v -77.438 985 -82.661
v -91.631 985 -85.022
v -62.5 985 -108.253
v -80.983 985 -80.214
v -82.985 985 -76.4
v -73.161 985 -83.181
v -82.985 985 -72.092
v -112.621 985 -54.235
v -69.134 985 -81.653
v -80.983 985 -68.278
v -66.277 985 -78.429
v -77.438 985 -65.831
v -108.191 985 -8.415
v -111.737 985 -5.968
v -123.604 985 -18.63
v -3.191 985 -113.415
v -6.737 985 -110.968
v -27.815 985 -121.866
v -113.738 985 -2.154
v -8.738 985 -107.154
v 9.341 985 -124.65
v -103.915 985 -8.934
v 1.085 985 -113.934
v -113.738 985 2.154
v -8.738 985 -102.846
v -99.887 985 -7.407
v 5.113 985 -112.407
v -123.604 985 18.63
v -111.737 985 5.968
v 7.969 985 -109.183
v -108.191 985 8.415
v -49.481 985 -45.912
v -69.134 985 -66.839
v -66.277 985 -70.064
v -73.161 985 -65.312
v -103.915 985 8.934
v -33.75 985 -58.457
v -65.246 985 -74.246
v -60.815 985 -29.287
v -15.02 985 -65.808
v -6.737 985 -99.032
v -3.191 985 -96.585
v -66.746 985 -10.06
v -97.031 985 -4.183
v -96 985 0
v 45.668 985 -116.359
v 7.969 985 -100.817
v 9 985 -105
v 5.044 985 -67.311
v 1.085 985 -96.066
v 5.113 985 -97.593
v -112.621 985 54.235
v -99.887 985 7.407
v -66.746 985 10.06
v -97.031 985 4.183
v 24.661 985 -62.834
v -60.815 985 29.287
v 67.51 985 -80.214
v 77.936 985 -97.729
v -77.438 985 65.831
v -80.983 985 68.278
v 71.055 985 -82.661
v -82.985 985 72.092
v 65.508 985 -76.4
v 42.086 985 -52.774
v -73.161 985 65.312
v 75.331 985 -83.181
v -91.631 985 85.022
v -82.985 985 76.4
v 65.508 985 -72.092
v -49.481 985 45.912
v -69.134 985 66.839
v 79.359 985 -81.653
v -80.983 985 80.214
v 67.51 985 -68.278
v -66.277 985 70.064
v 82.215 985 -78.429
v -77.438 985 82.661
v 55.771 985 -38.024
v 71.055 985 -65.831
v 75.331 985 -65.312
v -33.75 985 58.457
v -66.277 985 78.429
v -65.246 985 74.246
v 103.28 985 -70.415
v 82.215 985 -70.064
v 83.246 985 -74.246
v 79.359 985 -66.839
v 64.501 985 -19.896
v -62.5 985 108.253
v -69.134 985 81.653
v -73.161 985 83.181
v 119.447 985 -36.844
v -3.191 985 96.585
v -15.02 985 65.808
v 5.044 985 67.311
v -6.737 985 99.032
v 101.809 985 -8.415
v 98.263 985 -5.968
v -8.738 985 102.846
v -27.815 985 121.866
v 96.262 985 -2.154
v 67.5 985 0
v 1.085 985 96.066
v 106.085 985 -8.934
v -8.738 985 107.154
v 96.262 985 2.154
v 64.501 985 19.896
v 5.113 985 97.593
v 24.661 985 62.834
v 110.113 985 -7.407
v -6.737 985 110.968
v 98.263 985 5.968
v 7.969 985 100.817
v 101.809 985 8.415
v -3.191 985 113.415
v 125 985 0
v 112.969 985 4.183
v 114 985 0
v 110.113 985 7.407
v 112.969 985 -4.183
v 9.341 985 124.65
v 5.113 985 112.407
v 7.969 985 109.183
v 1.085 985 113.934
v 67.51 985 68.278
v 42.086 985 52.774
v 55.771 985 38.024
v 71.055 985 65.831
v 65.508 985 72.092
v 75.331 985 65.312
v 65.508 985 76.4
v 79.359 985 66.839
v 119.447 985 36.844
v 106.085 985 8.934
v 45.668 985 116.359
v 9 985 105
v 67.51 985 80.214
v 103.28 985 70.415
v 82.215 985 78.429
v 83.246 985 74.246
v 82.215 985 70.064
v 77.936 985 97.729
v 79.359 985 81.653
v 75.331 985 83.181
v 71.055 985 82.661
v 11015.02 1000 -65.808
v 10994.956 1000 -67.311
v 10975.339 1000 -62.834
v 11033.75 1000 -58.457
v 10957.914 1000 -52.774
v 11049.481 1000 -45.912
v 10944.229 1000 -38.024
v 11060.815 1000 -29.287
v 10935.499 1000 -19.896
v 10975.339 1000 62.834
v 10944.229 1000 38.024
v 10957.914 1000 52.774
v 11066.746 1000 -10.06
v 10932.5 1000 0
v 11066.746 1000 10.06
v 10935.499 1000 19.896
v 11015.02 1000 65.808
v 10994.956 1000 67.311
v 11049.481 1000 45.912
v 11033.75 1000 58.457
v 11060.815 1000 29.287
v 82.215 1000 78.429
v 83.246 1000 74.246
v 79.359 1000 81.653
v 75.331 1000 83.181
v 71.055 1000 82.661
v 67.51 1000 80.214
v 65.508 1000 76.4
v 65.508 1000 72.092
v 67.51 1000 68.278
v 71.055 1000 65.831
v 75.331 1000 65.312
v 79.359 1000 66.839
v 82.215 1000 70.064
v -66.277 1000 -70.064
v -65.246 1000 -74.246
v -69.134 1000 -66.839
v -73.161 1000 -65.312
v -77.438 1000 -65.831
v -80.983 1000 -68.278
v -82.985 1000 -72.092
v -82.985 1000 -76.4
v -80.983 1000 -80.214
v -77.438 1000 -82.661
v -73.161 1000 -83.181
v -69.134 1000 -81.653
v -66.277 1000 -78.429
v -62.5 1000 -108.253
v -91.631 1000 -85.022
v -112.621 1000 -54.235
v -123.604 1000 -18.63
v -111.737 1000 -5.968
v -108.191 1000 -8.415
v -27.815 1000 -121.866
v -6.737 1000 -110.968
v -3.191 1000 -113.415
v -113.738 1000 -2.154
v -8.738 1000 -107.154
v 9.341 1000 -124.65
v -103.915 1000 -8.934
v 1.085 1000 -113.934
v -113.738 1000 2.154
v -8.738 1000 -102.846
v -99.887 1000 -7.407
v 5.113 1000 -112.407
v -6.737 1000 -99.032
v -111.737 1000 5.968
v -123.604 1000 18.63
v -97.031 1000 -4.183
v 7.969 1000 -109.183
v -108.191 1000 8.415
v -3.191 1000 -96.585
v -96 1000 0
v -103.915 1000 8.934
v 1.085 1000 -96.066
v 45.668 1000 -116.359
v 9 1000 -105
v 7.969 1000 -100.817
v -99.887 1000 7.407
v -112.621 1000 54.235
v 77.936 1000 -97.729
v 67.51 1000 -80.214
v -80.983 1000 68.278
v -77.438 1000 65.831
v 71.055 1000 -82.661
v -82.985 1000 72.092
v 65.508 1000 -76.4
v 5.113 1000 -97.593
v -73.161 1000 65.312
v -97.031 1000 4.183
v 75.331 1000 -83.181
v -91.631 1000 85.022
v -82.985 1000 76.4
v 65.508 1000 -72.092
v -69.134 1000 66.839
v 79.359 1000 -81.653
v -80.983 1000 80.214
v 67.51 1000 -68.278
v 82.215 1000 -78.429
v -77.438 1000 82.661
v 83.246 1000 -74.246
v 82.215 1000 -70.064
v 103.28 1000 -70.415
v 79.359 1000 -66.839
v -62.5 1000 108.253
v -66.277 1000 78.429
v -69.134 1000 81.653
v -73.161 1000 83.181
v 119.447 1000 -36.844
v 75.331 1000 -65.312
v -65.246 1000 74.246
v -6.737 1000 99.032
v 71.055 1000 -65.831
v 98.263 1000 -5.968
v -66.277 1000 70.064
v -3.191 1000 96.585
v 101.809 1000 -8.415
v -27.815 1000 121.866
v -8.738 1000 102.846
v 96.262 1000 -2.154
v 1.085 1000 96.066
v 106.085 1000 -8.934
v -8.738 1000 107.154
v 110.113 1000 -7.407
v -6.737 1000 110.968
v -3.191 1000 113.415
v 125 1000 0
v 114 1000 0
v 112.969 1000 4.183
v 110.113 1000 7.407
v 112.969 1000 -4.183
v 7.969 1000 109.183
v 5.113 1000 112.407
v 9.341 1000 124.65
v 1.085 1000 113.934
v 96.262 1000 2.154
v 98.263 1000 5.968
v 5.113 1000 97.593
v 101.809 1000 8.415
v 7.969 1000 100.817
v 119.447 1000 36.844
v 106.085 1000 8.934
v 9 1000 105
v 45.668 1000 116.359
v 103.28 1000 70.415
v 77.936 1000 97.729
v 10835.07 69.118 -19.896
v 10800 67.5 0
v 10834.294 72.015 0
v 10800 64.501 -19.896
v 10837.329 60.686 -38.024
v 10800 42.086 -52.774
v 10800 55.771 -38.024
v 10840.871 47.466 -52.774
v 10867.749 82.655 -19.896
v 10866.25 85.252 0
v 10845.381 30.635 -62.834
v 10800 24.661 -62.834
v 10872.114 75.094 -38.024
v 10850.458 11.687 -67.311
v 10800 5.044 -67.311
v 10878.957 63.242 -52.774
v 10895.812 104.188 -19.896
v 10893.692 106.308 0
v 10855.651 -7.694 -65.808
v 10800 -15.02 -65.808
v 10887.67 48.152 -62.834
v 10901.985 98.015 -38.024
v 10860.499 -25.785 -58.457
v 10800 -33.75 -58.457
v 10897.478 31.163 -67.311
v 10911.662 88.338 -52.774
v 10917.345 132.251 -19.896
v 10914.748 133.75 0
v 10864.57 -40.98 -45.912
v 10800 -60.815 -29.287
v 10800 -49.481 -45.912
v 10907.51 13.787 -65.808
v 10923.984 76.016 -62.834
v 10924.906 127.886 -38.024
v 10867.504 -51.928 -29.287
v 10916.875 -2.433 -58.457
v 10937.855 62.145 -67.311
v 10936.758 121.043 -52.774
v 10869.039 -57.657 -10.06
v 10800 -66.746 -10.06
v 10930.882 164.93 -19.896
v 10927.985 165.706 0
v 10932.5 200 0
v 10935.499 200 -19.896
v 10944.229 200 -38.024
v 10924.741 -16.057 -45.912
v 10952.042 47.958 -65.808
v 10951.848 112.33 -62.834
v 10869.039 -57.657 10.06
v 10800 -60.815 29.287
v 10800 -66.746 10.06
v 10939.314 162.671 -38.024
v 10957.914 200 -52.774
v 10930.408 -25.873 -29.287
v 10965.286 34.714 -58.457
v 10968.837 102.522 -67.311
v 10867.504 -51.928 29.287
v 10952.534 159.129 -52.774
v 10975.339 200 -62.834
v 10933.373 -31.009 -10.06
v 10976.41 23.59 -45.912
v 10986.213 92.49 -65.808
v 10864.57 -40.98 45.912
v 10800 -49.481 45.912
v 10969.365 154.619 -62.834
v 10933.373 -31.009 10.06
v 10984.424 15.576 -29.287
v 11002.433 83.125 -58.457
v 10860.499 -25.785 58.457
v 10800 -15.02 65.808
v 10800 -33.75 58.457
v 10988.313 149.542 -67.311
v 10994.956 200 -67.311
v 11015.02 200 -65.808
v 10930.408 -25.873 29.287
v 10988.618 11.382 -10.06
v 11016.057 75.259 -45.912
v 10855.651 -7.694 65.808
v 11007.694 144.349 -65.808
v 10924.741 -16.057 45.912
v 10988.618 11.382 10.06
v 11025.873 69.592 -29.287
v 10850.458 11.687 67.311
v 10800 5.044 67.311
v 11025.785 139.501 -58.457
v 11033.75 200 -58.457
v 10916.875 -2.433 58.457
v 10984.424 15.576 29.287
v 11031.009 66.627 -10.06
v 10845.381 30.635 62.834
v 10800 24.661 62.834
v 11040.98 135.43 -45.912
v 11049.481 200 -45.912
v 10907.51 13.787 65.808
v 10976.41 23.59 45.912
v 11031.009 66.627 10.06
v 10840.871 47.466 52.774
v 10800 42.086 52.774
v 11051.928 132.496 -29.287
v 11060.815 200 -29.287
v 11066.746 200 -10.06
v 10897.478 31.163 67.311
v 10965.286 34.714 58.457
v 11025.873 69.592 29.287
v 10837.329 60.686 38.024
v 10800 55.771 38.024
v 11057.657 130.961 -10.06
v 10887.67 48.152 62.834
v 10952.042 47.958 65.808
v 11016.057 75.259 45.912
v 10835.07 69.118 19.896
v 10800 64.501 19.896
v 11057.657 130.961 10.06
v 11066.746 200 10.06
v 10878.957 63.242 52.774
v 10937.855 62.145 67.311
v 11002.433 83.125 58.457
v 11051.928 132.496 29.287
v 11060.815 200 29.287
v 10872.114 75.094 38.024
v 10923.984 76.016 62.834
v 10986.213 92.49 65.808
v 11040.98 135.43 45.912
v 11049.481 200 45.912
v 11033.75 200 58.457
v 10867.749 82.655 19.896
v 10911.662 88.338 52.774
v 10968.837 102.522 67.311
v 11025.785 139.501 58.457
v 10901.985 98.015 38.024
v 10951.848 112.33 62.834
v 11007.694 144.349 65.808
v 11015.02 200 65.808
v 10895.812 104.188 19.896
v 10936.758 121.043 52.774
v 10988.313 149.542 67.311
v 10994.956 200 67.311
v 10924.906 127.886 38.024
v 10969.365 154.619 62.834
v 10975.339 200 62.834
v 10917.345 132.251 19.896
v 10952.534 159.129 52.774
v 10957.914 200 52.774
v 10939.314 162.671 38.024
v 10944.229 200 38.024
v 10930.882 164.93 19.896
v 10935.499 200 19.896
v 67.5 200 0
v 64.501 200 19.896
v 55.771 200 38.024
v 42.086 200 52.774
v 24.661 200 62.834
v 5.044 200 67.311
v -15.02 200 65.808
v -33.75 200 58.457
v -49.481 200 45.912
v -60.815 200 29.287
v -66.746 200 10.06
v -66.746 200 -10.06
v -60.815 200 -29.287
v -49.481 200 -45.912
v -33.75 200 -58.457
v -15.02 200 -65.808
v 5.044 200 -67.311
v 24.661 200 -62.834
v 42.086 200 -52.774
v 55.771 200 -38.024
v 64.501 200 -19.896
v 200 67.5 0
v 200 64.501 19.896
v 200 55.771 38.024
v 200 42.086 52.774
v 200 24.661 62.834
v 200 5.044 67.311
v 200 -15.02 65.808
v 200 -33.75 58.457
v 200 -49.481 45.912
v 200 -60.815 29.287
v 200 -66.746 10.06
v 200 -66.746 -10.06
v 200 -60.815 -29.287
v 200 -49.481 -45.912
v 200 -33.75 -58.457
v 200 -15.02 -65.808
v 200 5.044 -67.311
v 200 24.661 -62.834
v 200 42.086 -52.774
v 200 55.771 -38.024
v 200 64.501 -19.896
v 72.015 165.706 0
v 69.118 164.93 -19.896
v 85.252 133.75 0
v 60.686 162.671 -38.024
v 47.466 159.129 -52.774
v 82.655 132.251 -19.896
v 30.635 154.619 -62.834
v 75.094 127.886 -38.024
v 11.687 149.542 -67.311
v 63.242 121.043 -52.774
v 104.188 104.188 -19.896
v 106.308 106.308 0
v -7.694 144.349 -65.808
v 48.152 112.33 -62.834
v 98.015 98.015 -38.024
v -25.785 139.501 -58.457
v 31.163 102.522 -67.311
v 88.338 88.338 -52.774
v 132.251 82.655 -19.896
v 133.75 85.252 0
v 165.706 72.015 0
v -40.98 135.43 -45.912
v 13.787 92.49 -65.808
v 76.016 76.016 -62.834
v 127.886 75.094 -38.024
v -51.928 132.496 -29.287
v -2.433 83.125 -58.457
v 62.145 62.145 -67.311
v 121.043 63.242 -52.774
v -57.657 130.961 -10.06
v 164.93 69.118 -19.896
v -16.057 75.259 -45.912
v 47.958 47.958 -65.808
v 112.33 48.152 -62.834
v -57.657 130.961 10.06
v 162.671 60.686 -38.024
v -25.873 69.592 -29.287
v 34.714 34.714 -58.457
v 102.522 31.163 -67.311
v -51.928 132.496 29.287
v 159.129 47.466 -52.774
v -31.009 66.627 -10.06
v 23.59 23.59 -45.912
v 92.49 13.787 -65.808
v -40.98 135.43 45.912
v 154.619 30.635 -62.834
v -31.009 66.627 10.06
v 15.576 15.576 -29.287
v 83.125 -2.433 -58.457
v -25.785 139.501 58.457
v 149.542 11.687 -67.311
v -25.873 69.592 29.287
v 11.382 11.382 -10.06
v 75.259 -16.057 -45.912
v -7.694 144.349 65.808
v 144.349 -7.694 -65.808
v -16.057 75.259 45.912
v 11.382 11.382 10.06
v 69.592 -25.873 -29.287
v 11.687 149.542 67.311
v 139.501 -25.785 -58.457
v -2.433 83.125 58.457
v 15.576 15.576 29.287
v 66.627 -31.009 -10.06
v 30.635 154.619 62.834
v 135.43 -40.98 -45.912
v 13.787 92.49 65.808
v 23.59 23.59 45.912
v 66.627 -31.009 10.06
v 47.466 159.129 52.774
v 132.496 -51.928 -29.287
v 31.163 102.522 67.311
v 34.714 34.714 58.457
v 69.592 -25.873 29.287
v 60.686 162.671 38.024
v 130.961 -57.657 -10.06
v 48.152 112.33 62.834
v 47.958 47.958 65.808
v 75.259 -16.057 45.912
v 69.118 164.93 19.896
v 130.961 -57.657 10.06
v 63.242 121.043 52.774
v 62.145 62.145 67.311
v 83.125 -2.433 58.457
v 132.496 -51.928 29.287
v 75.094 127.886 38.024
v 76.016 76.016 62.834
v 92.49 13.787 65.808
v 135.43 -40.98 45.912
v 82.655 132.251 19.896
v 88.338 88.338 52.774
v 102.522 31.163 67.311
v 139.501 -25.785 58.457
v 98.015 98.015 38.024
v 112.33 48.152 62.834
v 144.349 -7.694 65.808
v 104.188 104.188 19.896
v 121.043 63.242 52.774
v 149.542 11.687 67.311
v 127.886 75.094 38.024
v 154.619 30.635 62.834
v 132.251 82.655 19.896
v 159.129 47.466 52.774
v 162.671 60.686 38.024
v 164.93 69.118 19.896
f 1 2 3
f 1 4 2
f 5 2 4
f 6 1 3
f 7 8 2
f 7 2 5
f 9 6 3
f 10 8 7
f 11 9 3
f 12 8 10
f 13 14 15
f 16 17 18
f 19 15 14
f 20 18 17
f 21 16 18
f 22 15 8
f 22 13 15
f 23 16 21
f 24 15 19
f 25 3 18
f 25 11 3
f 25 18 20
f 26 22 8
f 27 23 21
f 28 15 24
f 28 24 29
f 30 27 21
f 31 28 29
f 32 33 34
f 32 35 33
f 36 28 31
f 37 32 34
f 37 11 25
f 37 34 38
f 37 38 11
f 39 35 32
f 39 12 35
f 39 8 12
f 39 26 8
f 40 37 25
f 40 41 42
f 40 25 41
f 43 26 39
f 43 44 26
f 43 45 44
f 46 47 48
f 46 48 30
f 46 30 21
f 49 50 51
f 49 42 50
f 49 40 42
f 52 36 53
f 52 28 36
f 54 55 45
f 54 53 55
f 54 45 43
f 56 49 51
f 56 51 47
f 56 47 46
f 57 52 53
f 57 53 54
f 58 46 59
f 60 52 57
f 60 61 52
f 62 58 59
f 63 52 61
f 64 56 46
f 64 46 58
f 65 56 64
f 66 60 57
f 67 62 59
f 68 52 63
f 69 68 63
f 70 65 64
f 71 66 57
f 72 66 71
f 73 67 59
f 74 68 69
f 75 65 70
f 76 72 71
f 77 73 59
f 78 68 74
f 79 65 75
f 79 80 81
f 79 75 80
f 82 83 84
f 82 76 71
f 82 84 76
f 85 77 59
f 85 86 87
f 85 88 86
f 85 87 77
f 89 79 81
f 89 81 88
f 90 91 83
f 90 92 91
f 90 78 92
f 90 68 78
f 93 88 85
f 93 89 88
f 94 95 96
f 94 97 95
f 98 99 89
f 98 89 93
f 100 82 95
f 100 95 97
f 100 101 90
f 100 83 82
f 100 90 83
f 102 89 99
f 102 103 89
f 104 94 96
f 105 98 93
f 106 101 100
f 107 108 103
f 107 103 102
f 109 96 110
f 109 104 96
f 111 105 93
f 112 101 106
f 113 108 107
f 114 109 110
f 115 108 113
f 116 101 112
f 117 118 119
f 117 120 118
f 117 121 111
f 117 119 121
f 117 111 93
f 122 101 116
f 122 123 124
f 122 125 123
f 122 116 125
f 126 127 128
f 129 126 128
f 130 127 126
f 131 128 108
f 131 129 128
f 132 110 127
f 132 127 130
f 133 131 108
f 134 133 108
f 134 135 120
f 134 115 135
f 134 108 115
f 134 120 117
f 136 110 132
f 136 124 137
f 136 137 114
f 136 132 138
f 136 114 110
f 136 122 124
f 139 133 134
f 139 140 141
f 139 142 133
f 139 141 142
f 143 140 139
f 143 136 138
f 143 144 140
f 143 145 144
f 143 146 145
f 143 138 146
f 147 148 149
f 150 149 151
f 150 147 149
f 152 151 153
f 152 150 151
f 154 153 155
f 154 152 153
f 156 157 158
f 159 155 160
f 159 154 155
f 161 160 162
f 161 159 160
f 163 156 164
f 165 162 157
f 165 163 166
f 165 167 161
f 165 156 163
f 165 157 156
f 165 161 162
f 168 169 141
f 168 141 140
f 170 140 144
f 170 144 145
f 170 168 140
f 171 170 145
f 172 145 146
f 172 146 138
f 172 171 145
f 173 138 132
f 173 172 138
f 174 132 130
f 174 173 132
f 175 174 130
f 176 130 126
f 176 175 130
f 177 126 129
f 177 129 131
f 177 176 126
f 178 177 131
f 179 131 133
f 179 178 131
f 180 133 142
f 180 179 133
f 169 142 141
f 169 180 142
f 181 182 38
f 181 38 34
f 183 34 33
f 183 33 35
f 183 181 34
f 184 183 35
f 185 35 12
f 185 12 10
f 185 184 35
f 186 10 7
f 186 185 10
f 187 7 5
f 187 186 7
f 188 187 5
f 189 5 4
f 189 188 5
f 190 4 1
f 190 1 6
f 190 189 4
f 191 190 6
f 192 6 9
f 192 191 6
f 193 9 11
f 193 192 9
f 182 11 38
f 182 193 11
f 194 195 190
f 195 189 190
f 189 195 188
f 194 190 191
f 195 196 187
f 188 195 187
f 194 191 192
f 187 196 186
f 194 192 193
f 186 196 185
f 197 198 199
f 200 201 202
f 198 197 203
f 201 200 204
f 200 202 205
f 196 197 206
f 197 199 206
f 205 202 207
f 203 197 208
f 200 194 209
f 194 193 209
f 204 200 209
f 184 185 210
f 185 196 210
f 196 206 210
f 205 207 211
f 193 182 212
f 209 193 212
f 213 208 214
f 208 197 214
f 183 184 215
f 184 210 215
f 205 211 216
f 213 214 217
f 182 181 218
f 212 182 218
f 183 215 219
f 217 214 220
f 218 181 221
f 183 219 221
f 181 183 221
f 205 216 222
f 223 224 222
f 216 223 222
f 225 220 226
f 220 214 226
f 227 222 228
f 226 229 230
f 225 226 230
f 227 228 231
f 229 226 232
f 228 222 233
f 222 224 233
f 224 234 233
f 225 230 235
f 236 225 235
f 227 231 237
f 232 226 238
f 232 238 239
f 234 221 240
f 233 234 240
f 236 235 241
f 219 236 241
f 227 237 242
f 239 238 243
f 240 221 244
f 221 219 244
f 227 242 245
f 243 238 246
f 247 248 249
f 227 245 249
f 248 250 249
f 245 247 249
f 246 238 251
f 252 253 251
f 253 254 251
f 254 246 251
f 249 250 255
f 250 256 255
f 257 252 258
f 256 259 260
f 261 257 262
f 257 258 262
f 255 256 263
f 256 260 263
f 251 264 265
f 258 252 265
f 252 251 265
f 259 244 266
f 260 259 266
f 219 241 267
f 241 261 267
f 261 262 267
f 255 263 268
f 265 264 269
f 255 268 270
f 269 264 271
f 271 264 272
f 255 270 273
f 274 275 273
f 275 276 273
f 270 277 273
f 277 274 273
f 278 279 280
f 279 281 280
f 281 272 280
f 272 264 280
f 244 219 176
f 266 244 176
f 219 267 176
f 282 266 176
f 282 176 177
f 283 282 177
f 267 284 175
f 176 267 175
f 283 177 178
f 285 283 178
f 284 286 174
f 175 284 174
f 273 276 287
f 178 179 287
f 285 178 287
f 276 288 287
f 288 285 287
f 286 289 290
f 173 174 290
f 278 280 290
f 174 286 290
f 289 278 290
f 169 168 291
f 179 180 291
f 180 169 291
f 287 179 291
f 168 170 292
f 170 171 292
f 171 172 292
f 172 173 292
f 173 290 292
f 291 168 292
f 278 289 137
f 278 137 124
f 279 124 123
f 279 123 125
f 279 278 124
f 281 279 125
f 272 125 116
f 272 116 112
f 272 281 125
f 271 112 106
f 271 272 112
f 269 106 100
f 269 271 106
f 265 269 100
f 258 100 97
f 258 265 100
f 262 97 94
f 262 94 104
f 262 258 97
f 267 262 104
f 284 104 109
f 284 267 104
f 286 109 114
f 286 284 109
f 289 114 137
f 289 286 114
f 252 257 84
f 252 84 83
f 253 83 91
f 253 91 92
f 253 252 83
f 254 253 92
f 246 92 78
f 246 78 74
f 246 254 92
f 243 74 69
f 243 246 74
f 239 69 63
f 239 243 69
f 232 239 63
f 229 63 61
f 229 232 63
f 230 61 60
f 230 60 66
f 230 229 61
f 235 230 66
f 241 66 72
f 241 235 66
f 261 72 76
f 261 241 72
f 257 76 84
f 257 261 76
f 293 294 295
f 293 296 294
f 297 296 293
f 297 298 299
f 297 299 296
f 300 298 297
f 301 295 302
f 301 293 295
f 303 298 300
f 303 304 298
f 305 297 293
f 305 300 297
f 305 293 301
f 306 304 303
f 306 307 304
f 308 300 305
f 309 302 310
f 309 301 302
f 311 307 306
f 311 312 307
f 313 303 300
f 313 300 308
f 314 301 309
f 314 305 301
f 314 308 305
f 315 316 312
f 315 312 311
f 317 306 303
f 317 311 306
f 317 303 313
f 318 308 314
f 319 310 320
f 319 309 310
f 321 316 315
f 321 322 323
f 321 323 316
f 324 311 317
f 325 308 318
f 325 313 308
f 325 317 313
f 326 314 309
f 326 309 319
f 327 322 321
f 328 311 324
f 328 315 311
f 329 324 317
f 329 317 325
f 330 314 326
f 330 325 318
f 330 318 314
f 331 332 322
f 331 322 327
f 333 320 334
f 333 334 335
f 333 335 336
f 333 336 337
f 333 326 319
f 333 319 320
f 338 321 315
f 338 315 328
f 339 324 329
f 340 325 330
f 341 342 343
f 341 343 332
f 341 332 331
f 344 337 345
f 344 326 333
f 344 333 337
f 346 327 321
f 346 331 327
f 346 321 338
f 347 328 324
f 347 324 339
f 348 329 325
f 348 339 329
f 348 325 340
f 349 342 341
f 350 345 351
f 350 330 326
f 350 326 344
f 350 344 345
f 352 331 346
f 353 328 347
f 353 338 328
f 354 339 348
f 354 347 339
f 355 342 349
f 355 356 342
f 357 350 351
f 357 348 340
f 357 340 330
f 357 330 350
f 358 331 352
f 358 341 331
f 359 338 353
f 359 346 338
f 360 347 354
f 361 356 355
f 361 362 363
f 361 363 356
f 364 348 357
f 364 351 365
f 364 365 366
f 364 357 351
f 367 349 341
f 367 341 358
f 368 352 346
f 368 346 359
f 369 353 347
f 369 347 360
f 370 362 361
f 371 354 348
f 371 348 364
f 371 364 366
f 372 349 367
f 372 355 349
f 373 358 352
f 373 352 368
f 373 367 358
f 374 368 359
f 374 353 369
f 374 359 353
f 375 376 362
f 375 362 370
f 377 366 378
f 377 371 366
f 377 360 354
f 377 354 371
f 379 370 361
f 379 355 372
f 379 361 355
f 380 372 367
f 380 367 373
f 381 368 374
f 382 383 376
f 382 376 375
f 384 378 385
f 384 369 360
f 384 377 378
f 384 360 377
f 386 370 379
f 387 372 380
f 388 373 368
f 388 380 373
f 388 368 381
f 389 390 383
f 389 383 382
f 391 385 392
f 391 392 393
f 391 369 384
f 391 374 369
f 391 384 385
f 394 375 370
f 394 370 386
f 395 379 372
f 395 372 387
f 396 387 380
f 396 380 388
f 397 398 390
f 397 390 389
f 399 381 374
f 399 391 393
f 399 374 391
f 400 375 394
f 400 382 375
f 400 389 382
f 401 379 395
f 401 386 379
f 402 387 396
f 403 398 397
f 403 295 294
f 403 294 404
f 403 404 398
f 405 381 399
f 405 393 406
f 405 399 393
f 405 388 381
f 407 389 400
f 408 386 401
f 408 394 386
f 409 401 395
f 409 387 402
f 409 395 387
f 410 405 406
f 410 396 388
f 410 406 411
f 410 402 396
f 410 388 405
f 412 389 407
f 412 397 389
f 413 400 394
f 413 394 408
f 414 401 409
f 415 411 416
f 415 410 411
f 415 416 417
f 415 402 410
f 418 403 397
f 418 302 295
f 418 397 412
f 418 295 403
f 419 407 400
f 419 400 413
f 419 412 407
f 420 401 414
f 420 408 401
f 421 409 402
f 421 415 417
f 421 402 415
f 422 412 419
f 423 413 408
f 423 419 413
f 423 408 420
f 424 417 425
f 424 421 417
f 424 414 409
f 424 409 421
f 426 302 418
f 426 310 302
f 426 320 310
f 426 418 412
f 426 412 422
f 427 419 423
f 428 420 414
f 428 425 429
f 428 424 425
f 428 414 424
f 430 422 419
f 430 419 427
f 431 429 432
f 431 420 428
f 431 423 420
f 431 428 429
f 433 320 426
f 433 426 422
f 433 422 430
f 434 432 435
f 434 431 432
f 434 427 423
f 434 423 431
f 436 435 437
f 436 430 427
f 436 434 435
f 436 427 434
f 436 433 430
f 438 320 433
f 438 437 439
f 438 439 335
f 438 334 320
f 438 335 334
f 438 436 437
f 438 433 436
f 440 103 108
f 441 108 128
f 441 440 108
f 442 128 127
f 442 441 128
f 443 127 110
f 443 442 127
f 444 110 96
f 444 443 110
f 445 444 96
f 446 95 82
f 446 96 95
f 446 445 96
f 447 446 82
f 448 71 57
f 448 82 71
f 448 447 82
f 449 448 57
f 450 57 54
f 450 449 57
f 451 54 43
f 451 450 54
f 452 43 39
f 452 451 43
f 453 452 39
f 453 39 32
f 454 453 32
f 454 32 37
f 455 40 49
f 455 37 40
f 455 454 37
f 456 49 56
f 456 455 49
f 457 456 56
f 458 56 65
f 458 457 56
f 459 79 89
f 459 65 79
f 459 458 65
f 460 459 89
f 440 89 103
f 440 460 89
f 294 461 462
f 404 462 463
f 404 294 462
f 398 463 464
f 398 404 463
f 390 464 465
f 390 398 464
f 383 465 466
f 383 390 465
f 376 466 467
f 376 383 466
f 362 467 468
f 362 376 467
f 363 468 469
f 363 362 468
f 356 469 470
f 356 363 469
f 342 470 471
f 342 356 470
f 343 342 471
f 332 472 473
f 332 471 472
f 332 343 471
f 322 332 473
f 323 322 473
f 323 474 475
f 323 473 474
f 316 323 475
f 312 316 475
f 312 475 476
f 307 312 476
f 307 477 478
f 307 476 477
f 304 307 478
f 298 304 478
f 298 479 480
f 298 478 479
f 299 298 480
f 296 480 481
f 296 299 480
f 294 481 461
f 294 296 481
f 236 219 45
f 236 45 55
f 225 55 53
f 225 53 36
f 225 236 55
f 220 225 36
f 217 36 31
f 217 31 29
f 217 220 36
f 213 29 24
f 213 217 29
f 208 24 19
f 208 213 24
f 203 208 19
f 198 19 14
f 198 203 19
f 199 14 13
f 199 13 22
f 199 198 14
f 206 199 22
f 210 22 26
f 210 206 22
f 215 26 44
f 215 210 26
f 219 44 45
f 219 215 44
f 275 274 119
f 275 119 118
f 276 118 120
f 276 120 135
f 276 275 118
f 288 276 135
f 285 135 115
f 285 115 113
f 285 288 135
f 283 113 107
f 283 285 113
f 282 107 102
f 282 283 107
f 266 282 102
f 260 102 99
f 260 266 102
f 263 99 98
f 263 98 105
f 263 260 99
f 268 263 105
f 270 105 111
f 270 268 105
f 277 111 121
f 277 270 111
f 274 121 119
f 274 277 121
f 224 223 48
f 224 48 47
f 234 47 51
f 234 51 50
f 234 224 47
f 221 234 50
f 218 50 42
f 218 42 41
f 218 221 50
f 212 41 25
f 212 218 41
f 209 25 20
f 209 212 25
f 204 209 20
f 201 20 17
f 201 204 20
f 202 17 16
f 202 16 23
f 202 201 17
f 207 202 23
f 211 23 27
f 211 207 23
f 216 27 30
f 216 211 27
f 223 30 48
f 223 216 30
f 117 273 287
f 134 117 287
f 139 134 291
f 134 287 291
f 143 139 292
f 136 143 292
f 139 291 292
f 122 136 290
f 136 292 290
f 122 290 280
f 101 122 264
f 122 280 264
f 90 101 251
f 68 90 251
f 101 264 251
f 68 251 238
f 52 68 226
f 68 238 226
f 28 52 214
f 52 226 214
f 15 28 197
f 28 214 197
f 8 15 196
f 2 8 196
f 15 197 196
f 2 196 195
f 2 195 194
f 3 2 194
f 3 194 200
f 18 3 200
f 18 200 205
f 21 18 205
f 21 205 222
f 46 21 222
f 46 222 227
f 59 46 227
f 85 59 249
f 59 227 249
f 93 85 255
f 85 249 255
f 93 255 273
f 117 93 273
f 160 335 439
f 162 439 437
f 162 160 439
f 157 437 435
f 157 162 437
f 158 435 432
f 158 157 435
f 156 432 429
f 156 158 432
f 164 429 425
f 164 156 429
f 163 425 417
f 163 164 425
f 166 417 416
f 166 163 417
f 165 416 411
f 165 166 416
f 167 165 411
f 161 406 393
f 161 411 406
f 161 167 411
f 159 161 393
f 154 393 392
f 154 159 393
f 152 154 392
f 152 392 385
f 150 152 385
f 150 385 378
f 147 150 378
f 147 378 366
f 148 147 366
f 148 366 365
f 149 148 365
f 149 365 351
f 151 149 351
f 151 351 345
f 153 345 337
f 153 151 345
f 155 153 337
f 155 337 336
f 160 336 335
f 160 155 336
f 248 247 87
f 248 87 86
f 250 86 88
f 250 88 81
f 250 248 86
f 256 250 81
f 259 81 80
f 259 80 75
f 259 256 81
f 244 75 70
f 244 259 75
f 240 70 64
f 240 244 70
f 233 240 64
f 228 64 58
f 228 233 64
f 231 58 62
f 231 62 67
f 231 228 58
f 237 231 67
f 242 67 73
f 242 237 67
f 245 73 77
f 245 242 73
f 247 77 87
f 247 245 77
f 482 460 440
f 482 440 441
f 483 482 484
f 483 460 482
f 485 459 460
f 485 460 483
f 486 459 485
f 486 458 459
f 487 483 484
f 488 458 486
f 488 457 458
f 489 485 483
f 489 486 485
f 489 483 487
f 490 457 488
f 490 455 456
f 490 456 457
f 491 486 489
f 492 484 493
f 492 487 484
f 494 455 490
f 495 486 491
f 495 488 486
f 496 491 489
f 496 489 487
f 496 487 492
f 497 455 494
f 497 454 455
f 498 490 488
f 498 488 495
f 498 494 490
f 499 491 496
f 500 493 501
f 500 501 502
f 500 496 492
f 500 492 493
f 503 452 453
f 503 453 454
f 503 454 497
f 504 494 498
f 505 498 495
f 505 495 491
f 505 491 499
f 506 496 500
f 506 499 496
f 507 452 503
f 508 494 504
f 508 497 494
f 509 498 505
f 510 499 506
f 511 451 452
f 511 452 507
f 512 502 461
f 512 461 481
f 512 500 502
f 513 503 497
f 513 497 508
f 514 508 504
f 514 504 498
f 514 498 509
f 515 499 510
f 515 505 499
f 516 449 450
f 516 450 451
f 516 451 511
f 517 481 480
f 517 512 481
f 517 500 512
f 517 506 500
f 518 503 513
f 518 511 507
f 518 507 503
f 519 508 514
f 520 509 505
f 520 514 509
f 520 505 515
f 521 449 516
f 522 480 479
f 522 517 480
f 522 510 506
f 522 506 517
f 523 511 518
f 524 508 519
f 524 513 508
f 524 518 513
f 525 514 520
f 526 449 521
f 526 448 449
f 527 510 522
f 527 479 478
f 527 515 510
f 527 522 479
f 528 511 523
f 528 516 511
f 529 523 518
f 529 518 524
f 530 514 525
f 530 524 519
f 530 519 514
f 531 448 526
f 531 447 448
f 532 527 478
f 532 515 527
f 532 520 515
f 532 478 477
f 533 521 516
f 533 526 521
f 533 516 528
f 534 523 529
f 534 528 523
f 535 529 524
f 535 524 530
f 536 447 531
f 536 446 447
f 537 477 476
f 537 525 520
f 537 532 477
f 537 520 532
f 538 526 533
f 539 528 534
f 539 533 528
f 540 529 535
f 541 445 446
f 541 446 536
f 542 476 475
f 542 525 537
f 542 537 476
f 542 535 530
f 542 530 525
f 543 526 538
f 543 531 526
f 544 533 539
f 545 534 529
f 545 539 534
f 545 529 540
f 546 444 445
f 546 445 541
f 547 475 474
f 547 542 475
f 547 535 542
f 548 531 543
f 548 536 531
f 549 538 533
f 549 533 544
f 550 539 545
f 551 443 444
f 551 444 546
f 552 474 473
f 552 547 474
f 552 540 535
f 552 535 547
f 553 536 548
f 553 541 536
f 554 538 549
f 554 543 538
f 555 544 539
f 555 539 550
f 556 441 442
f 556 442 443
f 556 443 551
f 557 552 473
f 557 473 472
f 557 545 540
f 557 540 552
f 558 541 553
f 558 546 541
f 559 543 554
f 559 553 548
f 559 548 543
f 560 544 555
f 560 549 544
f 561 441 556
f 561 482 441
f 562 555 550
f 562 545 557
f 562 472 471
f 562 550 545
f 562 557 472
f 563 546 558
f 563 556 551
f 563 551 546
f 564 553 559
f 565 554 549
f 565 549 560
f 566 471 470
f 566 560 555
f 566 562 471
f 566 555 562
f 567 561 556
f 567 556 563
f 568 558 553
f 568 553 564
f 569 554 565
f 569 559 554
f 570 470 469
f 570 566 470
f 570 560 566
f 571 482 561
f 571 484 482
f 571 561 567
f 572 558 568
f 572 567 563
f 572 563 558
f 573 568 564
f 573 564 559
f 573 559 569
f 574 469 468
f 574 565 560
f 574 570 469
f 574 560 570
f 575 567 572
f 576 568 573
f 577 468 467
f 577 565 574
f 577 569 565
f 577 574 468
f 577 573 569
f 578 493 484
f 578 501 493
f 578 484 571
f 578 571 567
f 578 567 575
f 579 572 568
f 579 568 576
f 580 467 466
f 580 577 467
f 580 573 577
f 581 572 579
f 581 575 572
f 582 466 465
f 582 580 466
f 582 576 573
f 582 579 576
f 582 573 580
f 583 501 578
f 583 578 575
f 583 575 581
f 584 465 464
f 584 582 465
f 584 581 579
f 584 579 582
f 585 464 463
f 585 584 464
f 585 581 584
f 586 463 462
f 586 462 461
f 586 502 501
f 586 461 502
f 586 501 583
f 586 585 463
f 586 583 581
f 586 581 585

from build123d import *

# Parameters (mm, degrees)
F2_R      = 67.5
F2_R_2    = 125
F2_R_3    = 9
F3_FACE_R = 67.5
F4_DEPTH  = 15


with BuildPart() as f3:
    # F3: sweep along a path in F0
    with BuildLine(Plane.XY) as f3_path:
        Line((0, 1000), (0, 200))
        ThreePointArc((0, 200), (58.5786437627, 58.5786437627), (200, 0))
        Line((200, 0), (10800, 0))
        ThreePointArc((10800, 0), (10941.4213562373, 58.5786437627), (11000, 200))
        Line((11000, 200), (11000, 1000))
    # F2 (on offset) → F3 (sweep)
    with BuildSketch(Plane.XZ.offset(-1000)):
        Circle(F2_R)
    sweep(path=f3_path.line)

    # F2 (on offset) + F3_face (on face) → F4 (join)
    with BuildSketch(Plane.XZ.offset(-1000)):
        Circle(F2_R_2)
        with Locations((-74.2462120246, -74.2462120246)):
            Circle(F2_R_3, mode=Mode.SUBTRACT)
        with Locations((0, -105)):
            Circle(F2_R_3, mode=Mode.SUBTRACT)
        with Locations((74.2462120246, -74.2462120246)):
            Circle(F2_R_3, mode=Mode.SUBTRACT)
        with Locations((-105, 0)):
            Circle(F2_R_3, mode=Mode.SUBTRACT)
        with Locations((-74.2462120246, 74.2462120246)):
            Circle(F2_R_3, mode=Mode.SUBTRACT)
        Circle(F2_R, mode=Mode.SUBTRACT)
        with Locations((105, 0)):
            Circle(F2_R_3, mode=Mode.SUBTRACT)
        with Locations((0, 105)):
            Circle(F2_R_3, mode=Mode.SUBTRACT)
        with Locations((74.2462120246, 74.2462120246)):
            Circle(F2_R_3, mode=Mode.SUBTRACT)
    with BuildSketch(Plane(origin=(0, 1000, 0), x_dir=(-1, 0, 0), z_dir=(0, 1, 0))):
        Circle(F3_FACE_R)
    extrude(amount=F4_DEPTH, dir=(0, -1, 0))


solid = f3.part
